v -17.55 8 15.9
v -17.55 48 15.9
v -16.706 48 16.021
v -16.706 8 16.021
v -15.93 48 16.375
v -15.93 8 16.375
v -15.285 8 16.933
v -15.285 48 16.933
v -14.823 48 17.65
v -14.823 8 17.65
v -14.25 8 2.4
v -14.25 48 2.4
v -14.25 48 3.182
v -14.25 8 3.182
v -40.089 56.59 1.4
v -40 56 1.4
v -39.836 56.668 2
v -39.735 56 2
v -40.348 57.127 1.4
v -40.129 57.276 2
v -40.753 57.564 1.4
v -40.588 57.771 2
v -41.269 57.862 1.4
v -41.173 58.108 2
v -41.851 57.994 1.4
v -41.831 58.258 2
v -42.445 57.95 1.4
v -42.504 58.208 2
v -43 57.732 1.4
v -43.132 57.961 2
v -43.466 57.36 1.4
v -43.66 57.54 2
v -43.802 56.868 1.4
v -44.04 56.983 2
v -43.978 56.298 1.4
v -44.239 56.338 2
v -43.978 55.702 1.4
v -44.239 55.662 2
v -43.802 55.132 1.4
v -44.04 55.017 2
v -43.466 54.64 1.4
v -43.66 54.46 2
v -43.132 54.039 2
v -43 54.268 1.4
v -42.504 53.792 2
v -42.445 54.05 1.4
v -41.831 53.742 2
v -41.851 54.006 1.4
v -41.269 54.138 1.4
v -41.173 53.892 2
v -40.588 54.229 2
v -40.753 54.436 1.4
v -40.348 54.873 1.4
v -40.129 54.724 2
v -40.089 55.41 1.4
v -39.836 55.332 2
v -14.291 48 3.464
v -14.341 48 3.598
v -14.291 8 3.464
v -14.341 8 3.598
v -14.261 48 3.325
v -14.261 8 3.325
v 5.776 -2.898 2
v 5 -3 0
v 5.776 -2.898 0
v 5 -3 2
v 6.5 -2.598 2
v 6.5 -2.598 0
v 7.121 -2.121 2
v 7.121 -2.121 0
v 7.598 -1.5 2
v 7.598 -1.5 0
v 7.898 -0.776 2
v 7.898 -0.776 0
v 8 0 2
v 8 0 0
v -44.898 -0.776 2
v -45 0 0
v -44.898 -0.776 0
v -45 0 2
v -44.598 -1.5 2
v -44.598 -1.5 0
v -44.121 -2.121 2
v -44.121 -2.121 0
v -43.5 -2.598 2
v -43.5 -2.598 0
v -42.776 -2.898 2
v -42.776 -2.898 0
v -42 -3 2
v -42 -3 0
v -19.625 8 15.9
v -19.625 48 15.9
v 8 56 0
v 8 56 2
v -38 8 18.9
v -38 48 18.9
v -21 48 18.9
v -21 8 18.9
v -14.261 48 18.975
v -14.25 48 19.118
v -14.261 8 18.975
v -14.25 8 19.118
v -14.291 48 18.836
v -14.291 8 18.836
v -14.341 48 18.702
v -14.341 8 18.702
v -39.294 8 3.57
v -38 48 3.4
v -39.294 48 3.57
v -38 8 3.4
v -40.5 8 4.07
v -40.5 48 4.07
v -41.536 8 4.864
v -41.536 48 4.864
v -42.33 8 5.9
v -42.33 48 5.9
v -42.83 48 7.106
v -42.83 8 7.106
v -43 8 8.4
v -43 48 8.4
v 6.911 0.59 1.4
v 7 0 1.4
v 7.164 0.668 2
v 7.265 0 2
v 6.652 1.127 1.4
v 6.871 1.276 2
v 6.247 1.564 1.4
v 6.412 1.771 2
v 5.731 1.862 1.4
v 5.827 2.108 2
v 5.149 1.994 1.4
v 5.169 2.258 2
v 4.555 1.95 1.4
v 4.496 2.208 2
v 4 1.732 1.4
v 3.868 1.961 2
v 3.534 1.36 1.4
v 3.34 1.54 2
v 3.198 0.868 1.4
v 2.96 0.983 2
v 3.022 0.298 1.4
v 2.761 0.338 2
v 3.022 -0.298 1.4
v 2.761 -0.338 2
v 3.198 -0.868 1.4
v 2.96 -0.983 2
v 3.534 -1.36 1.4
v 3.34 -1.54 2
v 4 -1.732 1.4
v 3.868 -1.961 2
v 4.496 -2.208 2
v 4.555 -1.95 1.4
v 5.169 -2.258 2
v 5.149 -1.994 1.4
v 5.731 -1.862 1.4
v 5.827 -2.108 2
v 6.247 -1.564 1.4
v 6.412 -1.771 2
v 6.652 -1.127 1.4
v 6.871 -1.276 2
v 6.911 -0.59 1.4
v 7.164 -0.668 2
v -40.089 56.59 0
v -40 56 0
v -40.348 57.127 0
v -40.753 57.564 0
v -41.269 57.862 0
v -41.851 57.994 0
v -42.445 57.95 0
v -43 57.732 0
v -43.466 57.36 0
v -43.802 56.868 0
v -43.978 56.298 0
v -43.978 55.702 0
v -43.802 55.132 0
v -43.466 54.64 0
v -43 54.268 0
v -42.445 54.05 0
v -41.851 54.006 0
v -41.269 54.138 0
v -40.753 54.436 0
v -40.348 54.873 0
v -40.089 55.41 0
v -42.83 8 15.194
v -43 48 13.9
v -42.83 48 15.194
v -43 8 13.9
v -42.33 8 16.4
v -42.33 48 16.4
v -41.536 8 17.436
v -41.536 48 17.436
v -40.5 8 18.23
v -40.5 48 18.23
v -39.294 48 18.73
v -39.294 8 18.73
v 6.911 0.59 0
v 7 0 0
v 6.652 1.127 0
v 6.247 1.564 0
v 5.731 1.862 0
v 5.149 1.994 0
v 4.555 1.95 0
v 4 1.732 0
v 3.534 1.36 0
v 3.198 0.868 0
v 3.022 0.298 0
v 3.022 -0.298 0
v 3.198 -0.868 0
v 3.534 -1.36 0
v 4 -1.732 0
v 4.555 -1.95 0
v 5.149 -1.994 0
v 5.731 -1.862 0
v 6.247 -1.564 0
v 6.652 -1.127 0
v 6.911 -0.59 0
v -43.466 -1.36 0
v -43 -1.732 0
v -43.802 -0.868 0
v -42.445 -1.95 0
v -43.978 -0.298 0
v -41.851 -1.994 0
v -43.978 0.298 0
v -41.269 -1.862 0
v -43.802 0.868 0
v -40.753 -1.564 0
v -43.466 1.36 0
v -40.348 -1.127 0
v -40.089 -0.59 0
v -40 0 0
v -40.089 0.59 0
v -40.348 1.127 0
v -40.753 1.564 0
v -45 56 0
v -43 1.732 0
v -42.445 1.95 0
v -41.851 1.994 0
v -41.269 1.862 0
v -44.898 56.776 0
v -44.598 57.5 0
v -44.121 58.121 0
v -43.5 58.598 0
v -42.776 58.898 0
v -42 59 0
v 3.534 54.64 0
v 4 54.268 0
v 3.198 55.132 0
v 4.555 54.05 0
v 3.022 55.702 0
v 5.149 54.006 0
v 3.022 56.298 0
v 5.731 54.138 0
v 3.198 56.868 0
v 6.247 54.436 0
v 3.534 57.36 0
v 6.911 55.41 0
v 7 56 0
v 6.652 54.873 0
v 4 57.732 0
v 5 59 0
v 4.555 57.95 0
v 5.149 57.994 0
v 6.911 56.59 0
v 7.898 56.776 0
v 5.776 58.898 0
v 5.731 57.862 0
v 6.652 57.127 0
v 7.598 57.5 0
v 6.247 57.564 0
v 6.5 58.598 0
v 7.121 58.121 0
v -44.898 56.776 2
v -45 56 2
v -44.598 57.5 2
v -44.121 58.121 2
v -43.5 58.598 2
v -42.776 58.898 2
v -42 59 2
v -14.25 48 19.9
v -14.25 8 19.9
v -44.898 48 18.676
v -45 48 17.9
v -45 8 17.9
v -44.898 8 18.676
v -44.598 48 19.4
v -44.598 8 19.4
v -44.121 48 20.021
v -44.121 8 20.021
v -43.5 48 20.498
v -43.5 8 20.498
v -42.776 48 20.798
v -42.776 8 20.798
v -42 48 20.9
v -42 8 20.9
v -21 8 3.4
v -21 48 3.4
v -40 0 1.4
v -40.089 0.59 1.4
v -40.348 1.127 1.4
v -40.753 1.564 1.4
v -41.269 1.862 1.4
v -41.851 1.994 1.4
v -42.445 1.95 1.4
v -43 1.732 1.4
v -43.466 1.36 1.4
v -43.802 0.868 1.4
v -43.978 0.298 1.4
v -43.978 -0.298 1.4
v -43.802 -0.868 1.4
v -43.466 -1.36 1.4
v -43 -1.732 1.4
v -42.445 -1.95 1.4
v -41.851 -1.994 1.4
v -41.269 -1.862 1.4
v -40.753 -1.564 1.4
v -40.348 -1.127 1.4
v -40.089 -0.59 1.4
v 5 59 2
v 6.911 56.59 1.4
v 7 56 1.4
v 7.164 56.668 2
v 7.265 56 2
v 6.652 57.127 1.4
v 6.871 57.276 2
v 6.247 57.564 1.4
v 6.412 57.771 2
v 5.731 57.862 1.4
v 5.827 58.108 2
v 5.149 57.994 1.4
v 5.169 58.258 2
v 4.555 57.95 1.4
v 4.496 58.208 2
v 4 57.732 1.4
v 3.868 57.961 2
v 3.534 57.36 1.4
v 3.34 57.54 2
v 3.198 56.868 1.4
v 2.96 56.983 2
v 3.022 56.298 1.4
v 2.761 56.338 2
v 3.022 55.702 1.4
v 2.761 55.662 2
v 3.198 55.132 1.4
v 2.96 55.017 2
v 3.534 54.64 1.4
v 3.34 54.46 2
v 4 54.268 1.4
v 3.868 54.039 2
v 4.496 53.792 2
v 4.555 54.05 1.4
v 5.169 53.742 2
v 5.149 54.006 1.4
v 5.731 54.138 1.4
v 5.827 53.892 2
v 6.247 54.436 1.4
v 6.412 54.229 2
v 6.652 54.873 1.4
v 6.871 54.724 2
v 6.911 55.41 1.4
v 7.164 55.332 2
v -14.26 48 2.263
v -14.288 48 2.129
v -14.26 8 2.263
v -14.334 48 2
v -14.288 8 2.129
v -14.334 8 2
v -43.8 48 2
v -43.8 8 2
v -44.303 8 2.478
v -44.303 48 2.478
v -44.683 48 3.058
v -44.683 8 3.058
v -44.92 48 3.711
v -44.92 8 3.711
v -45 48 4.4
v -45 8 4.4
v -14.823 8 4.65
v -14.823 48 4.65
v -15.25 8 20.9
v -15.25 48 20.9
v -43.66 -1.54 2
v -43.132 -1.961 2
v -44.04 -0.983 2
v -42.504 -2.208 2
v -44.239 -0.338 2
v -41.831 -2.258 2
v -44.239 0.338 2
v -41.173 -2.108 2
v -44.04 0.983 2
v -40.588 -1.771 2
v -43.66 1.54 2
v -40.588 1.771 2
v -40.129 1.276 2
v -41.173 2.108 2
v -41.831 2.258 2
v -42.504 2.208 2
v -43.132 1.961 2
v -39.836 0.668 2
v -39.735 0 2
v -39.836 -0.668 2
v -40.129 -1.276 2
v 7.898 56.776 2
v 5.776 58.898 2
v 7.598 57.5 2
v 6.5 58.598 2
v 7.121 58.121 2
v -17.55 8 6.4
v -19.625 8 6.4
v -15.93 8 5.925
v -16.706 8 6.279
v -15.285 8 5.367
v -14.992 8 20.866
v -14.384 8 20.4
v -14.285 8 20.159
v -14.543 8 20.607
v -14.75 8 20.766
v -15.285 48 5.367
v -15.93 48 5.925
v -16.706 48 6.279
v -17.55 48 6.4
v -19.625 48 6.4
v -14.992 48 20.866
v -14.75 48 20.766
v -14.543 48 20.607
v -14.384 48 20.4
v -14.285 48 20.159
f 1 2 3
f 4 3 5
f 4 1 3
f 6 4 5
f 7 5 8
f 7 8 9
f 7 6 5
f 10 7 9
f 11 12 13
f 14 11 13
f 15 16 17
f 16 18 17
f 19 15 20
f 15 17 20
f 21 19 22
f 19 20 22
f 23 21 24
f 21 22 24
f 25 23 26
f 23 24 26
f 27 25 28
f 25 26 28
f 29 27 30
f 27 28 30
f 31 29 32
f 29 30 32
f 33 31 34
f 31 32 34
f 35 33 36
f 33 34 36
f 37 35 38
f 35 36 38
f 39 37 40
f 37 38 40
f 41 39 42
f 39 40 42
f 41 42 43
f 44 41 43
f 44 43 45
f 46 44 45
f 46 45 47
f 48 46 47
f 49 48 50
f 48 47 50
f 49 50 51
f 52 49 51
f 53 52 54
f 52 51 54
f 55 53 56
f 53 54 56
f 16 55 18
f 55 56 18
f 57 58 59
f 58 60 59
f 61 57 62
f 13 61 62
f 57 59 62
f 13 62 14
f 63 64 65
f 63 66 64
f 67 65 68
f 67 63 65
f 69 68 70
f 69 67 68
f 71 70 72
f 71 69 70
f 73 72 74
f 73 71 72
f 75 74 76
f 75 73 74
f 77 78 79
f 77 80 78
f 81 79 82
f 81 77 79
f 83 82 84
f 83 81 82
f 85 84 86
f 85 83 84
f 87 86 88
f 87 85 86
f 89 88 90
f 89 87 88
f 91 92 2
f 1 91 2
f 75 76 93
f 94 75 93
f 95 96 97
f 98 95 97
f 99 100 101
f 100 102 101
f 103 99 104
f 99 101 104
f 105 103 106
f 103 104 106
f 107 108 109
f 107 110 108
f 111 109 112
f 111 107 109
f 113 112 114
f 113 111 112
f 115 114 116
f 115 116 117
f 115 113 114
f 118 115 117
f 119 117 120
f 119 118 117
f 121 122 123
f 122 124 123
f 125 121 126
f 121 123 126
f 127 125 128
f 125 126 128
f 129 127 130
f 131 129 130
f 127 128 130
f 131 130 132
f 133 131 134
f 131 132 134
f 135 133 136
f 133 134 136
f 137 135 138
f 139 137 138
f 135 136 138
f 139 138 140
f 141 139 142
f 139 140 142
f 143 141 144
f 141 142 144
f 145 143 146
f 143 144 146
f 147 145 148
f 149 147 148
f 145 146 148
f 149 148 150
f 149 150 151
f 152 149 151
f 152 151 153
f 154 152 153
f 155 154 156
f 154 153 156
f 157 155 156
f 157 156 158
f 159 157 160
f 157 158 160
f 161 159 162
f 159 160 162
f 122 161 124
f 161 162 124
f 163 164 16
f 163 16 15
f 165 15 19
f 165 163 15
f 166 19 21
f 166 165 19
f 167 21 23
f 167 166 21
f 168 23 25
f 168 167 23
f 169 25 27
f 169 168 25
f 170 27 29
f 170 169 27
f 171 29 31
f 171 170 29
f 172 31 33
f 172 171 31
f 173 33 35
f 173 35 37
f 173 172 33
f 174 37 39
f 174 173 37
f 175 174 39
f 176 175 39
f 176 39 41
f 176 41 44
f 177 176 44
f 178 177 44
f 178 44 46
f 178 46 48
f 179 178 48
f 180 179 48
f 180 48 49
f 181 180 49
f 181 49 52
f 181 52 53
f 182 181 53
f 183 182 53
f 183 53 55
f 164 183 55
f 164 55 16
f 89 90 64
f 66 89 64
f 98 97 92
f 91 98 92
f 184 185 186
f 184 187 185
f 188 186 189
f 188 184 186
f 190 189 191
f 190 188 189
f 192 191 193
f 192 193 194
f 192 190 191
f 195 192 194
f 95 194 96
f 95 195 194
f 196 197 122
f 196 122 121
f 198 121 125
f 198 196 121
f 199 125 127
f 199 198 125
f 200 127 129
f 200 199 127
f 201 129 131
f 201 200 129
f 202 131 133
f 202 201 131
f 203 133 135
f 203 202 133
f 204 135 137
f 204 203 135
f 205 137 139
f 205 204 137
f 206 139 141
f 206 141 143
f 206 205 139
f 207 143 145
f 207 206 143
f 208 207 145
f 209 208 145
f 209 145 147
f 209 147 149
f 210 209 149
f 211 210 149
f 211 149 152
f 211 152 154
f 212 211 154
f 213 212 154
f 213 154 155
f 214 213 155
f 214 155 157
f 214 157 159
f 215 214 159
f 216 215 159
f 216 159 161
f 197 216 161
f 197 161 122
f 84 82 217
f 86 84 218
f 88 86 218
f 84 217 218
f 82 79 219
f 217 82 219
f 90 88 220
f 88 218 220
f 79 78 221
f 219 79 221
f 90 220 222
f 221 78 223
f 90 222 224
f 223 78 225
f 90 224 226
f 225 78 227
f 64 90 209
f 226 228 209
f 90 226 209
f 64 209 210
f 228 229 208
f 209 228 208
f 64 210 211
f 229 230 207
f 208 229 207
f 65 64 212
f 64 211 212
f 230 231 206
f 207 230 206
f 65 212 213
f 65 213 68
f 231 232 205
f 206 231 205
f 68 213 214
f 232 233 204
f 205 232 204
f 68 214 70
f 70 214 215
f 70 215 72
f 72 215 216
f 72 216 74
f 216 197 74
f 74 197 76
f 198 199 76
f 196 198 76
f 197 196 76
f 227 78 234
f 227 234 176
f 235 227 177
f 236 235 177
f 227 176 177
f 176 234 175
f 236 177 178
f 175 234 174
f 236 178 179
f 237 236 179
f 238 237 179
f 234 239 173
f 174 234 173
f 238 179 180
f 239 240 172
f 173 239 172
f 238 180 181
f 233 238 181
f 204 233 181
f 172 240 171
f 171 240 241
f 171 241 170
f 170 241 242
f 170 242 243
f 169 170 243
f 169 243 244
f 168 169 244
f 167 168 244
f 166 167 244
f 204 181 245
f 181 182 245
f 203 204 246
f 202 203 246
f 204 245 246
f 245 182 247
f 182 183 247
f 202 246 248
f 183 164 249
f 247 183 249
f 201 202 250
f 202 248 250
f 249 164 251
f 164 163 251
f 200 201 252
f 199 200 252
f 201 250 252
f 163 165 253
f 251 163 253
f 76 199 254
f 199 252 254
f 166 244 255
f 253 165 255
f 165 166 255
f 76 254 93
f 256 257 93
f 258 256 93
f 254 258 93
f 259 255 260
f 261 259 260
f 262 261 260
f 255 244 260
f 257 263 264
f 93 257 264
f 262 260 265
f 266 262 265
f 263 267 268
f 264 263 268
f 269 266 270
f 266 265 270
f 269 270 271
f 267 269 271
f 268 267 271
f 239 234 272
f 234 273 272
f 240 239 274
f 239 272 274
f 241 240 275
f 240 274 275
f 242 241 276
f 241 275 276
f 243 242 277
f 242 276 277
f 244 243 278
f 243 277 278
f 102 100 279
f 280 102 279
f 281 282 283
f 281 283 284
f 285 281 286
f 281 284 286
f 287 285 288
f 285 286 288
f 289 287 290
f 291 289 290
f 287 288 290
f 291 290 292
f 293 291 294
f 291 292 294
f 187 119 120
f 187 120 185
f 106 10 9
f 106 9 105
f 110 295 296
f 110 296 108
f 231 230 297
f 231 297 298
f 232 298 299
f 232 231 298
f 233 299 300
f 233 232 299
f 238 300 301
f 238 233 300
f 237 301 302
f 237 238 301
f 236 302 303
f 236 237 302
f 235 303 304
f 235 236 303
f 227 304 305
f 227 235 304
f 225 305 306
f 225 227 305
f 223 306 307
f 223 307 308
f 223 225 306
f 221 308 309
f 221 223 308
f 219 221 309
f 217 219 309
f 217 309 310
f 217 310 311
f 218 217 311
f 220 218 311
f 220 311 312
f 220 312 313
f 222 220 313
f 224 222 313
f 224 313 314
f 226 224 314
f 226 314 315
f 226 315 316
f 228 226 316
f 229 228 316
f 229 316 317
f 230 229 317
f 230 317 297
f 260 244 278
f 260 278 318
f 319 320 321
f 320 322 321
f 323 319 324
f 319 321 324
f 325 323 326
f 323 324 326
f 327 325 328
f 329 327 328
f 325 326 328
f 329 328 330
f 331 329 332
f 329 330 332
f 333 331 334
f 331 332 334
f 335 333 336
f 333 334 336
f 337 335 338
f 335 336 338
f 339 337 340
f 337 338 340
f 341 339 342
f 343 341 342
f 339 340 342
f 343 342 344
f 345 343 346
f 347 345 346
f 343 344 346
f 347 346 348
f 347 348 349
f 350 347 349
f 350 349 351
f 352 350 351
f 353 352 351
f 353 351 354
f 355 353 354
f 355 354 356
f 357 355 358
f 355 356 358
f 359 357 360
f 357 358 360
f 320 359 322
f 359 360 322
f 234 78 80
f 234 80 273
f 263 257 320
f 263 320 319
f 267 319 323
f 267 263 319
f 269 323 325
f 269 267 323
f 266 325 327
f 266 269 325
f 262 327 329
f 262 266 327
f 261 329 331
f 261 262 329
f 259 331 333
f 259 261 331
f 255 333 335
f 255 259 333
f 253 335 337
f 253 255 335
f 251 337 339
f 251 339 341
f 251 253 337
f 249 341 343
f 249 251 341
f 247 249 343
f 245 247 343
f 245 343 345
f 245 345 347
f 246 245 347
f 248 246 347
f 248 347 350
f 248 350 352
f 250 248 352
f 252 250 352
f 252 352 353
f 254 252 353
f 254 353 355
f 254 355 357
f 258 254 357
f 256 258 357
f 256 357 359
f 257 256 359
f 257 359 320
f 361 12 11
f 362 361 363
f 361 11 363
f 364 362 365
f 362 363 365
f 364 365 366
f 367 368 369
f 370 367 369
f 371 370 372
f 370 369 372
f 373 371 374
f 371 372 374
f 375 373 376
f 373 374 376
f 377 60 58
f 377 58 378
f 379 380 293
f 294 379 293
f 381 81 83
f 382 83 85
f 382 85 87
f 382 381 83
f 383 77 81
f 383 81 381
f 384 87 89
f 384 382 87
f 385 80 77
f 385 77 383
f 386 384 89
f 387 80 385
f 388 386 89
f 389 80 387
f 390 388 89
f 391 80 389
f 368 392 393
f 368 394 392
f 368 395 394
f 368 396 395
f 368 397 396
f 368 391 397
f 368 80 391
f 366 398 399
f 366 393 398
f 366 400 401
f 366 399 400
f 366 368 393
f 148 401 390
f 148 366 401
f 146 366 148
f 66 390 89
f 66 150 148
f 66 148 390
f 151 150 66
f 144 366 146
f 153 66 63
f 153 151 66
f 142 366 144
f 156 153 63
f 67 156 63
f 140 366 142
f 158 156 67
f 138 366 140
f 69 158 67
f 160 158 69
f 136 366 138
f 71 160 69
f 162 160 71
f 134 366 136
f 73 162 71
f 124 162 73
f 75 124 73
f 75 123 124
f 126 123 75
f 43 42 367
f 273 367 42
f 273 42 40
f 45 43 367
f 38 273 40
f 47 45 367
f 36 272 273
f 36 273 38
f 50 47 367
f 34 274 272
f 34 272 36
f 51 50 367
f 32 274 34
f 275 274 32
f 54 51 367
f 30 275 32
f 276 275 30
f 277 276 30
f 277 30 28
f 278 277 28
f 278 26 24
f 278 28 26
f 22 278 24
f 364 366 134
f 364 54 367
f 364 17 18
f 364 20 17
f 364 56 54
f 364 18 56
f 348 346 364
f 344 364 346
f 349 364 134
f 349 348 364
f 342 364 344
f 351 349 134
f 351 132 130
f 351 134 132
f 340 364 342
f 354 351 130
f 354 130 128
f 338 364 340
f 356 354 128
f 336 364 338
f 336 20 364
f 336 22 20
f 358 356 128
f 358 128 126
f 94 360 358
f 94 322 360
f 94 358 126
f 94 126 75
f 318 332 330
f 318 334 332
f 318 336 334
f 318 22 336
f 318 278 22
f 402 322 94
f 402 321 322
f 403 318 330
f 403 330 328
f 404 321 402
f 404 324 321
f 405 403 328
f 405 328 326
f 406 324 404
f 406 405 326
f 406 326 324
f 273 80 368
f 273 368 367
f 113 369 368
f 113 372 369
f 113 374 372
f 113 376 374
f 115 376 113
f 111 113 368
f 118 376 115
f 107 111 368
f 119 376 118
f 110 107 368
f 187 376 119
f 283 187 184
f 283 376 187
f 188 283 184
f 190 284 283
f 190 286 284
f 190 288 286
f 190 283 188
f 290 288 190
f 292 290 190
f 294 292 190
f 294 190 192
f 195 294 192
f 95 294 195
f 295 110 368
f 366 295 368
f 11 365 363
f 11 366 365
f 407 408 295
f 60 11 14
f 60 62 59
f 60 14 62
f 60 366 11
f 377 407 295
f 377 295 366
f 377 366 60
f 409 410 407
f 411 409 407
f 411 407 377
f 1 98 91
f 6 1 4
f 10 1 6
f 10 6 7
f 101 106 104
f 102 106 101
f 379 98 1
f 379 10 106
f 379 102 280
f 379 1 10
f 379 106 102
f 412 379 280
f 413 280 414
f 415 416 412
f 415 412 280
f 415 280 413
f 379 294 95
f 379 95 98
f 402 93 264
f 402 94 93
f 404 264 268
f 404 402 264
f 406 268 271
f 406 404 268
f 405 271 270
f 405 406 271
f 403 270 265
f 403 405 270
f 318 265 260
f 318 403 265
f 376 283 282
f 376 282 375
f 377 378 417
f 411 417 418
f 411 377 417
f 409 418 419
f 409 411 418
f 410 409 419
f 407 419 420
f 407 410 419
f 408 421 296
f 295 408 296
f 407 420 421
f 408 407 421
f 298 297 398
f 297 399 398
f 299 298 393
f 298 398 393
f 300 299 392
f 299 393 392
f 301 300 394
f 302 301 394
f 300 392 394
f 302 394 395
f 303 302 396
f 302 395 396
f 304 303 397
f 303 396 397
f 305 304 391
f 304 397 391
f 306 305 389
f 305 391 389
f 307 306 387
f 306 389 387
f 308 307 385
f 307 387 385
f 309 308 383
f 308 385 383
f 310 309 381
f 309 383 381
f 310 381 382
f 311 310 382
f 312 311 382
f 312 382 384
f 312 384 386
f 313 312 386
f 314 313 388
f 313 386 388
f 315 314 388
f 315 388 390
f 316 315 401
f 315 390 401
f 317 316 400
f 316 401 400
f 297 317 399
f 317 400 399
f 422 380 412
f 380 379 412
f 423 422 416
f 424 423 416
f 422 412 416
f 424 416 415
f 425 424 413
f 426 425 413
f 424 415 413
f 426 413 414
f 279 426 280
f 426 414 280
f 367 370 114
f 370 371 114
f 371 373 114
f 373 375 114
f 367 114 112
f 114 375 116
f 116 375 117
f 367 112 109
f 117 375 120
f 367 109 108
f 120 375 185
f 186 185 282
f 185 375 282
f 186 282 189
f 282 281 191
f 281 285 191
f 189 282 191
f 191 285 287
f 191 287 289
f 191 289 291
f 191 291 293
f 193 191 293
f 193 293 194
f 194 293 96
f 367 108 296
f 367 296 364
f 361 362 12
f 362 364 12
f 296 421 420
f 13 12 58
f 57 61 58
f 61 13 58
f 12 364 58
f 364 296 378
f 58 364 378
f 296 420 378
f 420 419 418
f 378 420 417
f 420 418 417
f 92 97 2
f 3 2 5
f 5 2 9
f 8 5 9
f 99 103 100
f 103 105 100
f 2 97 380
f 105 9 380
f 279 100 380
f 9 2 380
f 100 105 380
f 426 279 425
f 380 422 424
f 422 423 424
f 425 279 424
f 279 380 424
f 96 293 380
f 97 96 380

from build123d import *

# Parameters (mm, degrees)
CYLINDER017_R             = 2
CYLINDER017_DEPTH         = 9.2
CYLINDER018_R             = 3.5
CYLINDER018_DEPTH         = 10
CYLINDER016_R             = 2
CYLINDER016_DEPTH         = 9.2
CYLINDER019_R             = 3.5
CYLINDER019_DEPTH         = 10
CYLINDER014_R             = 2
CYLINDER014_DEPTH         = 9.2
CYLINDER015_R             = 3.5
CYLINDER015_DEPTH         = 10
CYLINDER013_R             = 2
CYLINDER013_DEPTH         = 9.2
CYLINDER012_R             = 3.5
CYLINDER012_DEPTH         = 10
BOX_W                     = 53
BOX_H                     = 62
BOX_DEPTH                 = 2
FILLET001_R               = 3
PAD003_DEPTH              = 40
FILLET004_R               = 3
FILLET005_R               = 1
FILLET002_R               = 5
FILLET003_R               = 3
FILLET003_PLACEMENT_ANGLE = 90


with BuildPart() as pass_screw_thread003:
    # Cylinder017 → Cylinder017 (new body)
    with BuildSketch(Plane.XY.offset(-9.2)):
        Circle(CYLINDER017_R)
    extrude(amount=CYLINDER017_DEPTH)


with BuildPart() as pass_screw_head003:
    # Cone007 → Cone007 (revolve)
    with BuildSketch(Plane.XZ):
        Polygon((0, 0), (2, 0), (3.5, 3.4), (0, 3.4), align=None)
    revolve(axis=Axis((0, 0, 0), (0, 0, 1)))


with BuildPart() as pass_screw003:
    # Cylinder018 → Cylinder018 (new body)
    with BuildSketch(Plane.XY.offset(3.2)):
        Circle(CYLINDER018_R)
    extrude(amount=CYLINDER018_DEPTH)

    # Fusion016: union pass-screw-thread003, pass-screw-head003
    add(pass_screw_thread003.part)
    add(pass_screw_head003.part)


with BuildPart() as pass_screw003_1:
    # Fusion016 placement: moved
    add(pass_screw003.part.moved(Location((42, 0, 18))))


with BuildPart() as pass_screw_thread002:
    # Cylinder016 → Cylinder016 (new body)
    with BuildSketch(Plane.XY.offset(-9.2)):
        Circle(CYLINDER016_R)
    extrude(amount=CYLINDER016_DEPTH)


with BuildPart() as pass_screw_head002:
    # Cone006 → Cone006 (revolve)
    with BuildSketch(Plane.XZ):
        Polygon((0, 0), (2, 0), (3.5, 3.4), (0, 3.4), align=None)
    revolve(axis=Axis((0, 0, 0), (0, 0, 1)))


with BuildPart() as pass_screw_top:
    # Cylinder019 → Cylinder019 (new body)
    with BuildSketch(Plane.XY.offset(3.2)):
        Circle(CYLINDER019_R)
    extrude(amount=CYLINDER019_DEPTH)

    # Fusion015: union pass-screw-thread002, pass-screw-head002
    add(pass_screw_thread002.part)
    add(pass_screw_head002.part)


with BuildPart() as pass_screw_top_1:
    # Fusion015 placement: moved
    add(pass_screw_top.part.moved(Location((-5, 0, 18))))

    # Fusion017: union pass-screw003
    add(pass_screw003_1.part)


with BuildPart() as pass_screw_top_2:
    # Fusion017 placement: moved
    add(pass_screw_top_1.part.moved(Location((0, 56, 0))))


with BuildPart() as pass_screw_thread001:
    # Cylinder014 → Cylinder014 (new body)
    with BuildSketch(Plane.XY.offset(-9.2)):
        Circle(CYLINDER014_R)
    extrude(amount=CYLINDER014_DEPTH)


with BuildPart() as pass_screw_head001:
    # Cone005 → Cone005 (revolve)
    with BuildSketch(Plane.XZ):
        Polygon((0, 0), (2, 0), (3.5, 3.4), (0, 3.4), align=None)
    revolve(axis=Axis((0, 0, 0), (0, 0, 1)))


with BuildPart() as pass_screw001:
    # Cylinder015 → Cylinder015 (new body)
    with BuildSketch(Plane.XY.offset(3.2)):
        Circle(CYLINDER015_R)
    extrude(amount=CYLINDER015_DEPTH)

    # Fusion013: union pass-screw-thread001, pass-screw-head001
    add(pass_screw_thread001.part)
    add(pass_screw_head001.part)


with BuildPart() as pass_screw001_1:
    # Fusion013 placement: moved
    add(pass_screw001.part.moved(Location((42, 0, 18))))


with BuildPart() as pass_screw_thread:
    # Cylinder013 → Cylinder013 (new body)
    with BuildSketch(Plane.XY.offset(-9.2)):
        Circle(CYLINDER013_R)
    extrude(amount=CYLINDER013_DEPTH)


with BuildPart() as pass_screw_head:
    # Cone → Cone (revolve)
    with BuildSketch(Plane.XZ):
        Polygon((0, 0), (2, 0), (3.5, 3.4), (0, 3.4), align=None)
    revolve(axis=Axis((0, 0, 0), (0, 0, 1)))


with BuildPart() as fusion018:
    # Cylinder012 → Cylinder012 (new body)
    with BuildSketch(Plane.XY.offset(3.2)):
        Circle(CYLINDER012_R)
    extrude(amount=CYLINDER012_DEPTH)

    # Fusion012: union pass-screw-thread, pass-screw-head
    add(pass_screw_thread.part)
    add(pass_screw_head.part)


with BuildPart() as fusion018_1:
    # Fusion012 placement: moved
    add(fusion018.part.moved(Location((-5, 0, 18))))

    # Fusion014: union pass-screw001
    add(pass_screw001_1.part)

    # Fusion018: union pass-screw-top
    add(pass_screw_top_2.part)


with BuildPart() as top_plate_with_screws:
    # Box → Box (new body)
    with BuildSketch(Plane(origin=(-8, -3, 16.6), x_dir=(1, 0, 0), z_dir=(0, 0, 1))):
        with Locations((26.5, 31)):
            Rectangle(BOX_W, BOX_H)
    extrude(amount=BOX_DEPTH)

    # Fillet001
    fillet001_edges = [top_plate_with_screws.edges().sort_by_distance(p)[0] for p in [
        (-8, -3, 17.6),
        (-8, 59, 17.6),
        (45, -3, 17.6),
        (45, 59, 17.6),
    ]]
    fillet(fillet001_edges, radius=FILLET001_R)

    # Cut002: cut Fusion018
    add(fusion018_1.part, mode=Mode.SUBTRACT)


with BuildPart() as final_top_plate_with_clip:
    # Sketch003 → Pad003 (new body)
    with BuildSketch(Plane.XY):
        Polygon((0, 0), (30.749545, 0), (30.749545, 2), (29.374773, 5), (25.374773, 5), (24, 2), (2, 2), (2, 17.5), (24, 17.5), (25.374773, 14.5), (29.374773, 14.5), (30.749545, 17.5), (30.749545, 19.5), (0, 19.5), align=None)
    extrude(amount=PAD003_DEPTH)

    # Fillet004
    fillet004_edges = [final_top_plate_with_clip.edges().sort_by_distance(p)[0] for p in [
        (29.374773, 5, 20),
        (29.374773, 14.5, 20),
    ]]
    fillet(fillet004_edges, radius=FILLET004_R)

    # Fillet005
    fillet005_edges = [final_top_plate_with_clip.edges().sort_by_distance(p)[0] for p in [
        (30.749545, 2, 20),
        (30.749545, 0, 20),
        (30.749545, 19.5, 20),
        (30.749545, 17.5, 20),
    ]]
    fillet(fillet005_edges, radius=FILLET005_R)

    # Fillet002
    fillet002_edges = [final_top_plate_with_clip.edges().sort_by_distance(p)[0] for p in [
        (2, 2, 20),
        (2, 17.5, 20),
    ]]
    fillet(fillet002_edges, radius=FILLET002_R)

    # Fillet003
    fillet003_edges = [final_top_plate_with_clip.edges().sort_by_distance(p)[0] for p in [
        (0, 0, 20),
        (0, 19.5, 20),
    ]]
    fillet(fillet003_edges, radius=FILLET003_R)


with BuildPart() as final_top_plate_with_clip_1:
    # Fillet003 placement: moved
    add(final_top_plate_with_clip.part.moved(Location((-8, 48, 18))).rotate(Axis((-8, 48, 18), (1, 0, 0)), FILLET003_PLACEMENT_ANGLE))

    # Fusion019: union top-plate-with-screws
    add(top_plate_with_screws.part)


with BuildPart() as final_top_plate_with_clip_2:
    # Fusion019 placement: moved
    add(final_top_plate_with_clip_1.part.moved(Location((-37, 0, -16.6))))


solid = final_top_plate_with_clip_2.part
